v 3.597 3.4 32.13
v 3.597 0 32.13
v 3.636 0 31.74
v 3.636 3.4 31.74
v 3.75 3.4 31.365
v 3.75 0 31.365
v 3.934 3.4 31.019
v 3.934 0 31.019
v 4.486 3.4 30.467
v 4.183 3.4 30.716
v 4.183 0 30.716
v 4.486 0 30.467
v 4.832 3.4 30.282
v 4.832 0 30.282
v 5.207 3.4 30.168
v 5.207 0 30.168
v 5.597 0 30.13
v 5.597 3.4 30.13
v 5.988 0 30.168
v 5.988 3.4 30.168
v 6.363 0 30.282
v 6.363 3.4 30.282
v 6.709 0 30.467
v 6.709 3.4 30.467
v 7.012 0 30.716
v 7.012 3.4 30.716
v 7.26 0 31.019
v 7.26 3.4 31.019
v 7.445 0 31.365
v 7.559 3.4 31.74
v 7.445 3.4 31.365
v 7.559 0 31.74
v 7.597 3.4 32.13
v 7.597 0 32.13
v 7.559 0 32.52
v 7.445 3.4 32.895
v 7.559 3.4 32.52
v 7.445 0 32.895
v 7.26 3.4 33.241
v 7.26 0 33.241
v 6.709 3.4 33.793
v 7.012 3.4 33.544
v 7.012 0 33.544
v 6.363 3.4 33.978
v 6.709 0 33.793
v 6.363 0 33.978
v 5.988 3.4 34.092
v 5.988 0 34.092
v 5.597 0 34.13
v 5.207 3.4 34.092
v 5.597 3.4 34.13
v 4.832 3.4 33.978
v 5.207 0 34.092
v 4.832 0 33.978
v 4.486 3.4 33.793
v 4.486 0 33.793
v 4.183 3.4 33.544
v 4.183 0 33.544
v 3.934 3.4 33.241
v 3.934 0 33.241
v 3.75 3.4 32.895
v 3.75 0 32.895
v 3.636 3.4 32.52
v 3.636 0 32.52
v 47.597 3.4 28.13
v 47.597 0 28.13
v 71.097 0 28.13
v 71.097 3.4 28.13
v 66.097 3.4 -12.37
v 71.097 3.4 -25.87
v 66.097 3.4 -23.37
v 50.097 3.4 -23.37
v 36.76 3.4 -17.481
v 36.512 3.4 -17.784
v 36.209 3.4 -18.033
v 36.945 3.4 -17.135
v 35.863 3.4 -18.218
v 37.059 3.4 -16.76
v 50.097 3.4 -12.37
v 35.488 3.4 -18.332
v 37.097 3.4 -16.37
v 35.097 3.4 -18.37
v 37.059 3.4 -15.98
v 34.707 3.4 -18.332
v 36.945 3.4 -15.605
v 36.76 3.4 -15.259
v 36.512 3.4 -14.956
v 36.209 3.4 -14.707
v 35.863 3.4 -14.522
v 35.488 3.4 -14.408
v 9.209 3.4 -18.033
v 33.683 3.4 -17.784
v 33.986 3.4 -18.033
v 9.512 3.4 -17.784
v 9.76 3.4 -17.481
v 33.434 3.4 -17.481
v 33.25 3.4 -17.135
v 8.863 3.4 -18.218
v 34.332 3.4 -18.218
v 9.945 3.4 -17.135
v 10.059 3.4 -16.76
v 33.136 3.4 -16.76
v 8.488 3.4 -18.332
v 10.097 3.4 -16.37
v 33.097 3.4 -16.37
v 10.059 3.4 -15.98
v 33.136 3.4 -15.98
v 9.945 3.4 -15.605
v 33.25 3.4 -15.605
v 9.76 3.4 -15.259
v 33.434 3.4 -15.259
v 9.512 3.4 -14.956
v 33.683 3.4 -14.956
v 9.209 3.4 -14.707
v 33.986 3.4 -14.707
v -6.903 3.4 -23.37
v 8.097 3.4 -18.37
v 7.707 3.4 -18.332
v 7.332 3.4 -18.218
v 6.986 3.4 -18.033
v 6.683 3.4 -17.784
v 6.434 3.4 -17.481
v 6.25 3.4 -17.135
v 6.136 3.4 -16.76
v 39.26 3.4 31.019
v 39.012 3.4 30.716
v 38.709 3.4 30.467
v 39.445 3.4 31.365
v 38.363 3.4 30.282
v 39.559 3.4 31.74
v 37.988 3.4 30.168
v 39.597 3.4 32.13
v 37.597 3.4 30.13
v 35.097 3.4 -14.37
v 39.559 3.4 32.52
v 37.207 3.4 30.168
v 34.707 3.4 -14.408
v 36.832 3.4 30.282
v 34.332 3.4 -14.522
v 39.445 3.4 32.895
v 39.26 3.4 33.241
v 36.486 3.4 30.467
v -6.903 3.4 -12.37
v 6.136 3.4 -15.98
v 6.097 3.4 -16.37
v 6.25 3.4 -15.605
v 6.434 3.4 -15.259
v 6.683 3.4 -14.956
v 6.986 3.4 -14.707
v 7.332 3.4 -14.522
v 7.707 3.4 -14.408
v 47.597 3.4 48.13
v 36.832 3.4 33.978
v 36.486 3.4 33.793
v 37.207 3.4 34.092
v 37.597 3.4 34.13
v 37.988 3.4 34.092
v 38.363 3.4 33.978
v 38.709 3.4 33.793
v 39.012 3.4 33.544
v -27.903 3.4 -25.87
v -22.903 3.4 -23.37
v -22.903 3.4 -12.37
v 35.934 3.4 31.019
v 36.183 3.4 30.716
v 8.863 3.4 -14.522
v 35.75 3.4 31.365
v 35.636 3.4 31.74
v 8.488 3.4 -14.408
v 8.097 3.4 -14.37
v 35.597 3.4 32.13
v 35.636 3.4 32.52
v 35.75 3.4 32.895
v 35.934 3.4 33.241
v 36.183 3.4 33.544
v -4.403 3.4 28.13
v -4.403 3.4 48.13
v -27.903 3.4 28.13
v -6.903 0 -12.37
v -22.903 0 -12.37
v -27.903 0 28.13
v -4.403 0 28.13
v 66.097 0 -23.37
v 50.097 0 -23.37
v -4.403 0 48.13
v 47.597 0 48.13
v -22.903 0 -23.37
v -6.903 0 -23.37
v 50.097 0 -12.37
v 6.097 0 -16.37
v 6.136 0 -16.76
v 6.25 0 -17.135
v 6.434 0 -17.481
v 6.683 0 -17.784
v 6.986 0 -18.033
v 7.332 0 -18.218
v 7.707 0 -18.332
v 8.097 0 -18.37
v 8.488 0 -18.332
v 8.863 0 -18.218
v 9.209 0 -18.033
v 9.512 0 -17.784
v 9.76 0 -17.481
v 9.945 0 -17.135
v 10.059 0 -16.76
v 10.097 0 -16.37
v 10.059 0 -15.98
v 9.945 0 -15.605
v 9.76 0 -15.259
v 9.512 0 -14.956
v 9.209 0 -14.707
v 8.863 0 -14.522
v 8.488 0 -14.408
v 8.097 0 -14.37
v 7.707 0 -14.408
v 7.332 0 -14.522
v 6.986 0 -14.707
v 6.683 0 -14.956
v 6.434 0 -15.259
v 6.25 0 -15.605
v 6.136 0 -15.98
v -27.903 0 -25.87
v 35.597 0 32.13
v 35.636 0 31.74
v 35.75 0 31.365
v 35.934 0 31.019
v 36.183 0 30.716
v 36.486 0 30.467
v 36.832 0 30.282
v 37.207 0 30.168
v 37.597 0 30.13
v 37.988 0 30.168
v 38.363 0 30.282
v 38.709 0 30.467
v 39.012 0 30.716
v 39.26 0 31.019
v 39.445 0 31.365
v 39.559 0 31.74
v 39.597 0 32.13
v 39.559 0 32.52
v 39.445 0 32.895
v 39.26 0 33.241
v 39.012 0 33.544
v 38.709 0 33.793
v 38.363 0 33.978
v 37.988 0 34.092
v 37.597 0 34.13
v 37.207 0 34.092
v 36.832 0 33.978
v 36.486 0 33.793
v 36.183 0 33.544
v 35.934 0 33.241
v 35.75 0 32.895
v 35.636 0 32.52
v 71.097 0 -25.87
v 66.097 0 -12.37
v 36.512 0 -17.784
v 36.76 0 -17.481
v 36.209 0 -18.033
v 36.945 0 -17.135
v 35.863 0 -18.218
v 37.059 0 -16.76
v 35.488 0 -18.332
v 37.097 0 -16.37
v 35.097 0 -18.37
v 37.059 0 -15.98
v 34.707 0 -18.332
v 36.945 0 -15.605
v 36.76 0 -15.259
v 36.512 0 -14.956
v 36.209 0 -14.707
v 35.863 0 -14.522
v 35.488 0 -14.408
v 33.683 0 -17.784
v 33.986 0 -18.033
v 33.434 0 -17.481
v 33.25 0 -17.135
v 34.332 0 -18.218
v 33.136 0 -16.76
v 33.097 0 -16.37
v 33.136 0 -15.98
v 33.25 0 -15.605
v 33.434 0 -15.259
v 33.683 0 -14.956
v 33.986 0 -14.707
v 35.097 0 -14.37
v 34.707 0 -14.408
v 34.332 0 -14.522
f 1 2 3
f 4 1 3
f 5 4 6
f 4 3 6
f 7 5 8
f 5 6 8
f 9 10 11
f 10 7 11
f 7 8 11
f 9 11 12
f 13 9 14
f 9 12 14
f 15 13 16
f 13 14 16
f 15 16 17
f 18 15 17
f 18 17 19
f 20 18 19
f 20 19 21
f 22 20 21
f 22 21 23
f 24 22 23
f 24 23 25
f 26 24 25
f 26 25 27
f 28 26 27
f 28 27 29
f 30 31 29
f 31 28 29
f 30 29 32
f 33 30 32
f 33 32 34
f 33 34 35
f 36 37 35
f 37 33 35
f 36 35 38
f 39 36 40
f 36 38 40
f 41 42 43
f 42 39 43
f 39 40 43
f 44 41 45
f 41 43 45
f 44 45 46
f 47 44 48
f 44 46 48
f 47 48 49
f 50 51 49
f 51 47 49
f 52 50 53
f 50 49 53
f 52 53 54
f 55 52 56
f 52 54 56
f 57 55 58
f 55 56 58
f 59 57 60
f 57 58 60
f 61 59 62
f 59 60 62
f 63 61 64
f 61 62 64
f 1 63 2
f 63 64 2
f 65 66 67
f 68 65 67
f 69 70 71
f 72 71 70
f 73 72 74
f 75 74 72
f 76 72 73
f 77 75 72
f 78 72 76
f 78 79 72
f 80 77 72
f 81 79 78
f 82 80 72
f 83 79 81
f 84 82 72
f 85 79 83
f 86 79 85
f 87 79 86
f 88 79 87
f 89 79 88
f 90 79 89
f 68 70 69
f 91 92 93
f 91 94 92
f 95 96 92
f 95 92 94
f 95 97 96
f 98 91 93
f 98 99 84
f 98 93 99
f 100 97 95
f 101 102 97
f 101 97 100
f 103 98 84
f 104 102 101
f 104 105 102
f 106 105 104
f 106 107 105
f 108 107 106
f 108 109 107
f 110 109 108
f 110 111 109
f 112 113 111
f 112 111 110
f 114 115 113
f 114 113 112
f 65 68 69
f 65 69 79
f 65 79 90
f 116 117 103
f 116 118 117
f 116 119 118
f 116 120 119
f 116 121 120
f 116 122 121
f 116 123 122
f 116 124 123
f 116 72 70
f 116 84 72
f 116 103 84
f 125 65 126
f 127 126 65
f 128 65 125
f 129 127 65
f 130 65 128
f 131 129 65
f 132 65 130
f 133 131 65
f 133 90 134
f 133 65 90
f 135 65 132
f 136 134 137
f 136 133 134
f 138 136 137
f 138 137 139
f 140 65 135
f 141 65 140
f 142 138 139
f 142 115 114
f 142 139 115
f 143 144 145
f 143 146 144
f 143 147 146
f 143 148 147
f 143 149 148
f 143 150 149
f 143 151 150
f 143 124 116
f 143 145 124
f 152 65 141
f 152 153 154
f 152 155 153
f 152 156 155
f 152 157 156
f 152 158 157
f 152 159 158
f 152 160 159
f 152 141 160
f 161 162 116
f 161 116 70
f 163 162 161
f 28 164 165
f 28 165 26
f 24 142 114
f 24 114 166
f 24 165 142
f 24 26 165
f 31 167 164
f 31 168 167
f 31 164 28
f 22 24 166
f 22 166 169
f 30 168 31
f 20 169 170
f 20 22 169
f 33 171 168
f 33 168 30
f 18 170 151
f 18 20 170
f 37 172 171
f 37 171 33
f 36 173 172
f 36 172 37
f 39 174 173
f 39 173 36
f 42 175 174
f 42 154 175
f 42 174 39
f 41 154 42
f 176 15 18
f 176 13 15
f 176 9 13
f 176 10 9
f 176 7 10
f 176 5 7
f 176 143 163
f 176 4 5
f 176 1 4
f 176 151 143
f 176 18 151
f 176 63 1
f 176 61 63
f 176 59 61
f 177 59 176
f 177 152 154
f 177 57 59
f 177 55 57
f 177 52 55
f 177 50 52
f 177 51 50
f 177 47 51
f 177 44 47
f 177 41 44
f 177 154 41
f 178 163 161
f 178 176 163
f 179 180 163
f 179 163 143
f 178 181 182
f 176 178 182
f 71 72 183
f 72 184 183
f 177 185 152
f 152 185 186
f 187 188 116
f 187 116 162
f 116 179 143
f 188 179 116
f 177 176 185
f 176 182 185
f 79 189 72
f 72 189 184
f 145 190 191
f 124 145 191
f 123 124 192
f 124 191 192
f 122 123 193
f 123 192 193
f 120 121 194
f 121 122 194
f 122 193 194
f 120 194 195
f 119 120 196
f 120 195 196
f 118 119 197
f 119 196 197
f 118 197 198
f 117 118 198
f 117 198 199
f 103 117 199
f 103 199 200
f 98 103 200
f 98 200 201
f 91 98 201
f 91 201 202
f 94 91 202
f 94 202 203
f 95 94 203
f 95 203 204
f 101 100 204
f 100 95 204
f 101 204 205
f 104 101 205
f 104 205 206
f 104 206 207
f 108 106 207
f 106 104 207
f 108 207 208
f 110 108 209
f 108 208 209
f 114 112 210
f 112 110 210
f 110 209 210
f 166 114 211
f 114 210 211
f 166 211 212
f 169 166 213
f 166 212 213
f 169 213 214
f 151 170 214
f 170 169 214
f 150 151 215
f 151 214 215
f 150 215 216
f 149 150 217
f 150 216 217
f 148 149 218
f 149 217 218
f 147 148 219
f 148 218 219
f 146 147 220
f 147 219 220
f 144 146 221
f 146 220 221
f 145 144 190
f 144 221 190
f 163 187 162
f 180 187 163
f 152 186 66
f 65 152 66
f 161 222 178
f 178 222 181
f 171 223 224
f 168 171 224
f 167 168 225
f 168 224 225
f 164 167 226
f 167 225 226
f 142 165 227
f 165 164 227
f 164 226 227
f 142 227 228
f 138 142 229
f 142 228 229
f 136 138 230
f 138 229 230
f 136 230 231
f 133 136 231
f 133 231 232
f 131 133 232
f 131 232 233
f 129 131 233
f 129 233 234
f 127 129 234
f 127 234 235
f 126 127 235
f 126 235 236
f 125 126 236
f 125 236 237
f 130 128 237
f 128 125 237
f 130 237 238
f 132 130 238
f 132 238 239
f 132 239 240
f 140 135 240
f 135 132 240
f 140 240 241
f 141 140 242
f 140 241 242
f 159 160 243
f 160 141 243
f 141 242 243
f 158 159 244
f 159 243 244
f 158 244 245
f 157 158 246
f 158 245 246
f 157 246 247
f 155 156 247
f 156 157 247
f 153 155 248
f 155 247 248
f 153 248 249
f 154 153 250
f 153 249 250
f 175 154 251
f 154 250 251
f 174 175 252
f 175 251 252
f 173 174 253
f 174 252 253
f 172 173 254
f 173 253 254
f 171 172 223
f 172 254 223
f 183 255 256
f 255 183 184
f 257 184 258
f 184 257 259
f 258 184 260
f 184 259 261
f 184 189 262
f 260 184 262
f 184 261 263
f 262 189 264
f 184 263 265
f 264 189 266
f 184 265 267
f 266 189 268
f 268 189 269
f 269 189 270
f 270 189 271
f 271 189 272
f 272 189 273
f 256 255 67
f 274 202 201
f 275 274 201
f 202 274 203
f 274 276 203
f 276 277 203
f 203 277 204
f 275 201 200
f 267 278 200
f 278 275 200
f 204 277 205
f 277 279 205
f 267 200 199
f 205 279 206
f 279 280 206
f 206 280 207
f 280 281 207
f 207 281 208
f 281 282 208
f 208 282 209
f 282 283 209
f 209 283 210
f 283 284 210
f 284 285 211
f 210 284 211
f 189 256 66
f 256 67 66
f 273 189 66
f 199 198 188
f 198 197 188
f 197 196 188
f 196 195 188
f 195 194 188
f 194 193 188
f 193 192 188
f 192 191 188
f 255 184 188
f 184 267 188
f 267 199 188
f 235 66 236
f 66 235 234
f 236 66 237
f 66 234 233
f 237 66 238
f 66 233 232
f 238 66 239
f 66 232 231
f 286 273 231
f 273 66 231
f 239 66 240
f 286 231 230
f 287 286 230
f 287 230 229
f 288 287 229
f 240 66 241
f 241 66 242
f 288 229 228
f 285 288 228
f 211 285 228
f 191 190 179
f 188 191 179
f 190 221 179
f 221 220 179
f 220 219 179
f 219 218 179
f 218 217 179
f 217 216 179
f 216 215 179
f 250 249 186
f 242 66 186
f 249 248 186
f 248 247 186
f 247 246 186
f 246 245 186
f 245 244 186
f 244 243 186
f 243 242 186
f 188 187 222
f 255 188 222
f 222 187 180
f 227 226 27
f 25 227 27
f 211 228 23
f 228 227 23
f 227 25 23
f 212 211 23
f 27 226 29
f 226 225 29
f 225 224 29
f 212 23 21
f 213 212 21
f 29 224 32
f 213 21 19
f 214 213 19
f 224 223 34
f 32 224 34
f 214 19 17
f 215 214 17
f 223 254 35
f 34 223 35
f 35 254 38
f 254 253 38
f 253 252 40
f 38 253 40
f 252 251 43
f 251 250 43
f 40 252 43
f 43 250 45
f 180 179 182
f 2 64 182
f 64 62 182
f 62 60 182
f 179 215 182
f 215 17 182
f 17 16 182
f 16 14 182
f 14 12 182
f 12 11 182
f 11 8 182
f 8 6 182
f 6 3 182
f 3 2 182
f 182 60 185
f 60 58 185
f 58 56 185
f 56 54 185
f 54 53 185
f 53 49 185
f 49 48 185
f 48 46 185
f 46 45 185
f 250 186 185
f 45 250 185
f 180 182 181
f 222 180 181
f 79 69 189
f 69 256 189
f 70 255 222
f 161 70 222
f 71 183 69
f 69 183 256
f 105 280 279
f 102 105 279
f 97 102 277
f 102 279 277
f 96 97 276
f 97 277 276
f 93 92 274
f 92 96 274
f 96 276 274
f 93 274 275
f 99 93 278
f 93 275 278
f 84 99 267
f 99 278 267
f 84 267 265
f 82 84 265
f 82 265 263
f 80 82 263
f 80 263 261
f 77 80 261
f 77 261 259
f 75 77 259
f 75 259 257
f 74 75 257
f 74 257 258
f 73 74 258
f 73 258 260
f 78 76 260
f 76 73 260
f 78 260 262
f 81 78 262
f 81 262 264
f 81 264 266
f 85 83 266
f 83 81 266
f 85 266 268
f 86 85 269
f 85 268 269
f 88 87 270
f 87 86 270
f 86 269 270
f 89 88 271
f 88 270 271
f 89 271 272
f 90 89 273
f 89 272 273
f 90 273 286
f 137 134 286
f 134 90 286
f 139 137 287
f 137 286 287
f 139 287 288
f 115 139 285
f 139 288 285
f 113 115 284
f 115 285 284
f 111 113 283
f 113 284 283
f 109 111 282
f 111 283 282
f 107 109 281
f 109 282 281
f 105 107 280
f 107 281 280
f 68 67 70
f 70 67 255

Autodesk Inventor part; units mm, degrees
ref_plane "YZ Plane" through (0, 0, 0) normal (1, 0, 0) x (0, 1, 0)
ref_plane "XZ Plane" through (0, 0, 0) normal (0, 1, 0) x (-1, 0, 0)
ref_plane "XY Plane" through (0, 0, 0) normal (0, 0, 1) x (1, 0, 0)
sketch "Boceto1" plane through (0, 0, 0) normal (0, 1, 0) x (-1, 0, 0)
  line L0 (-71.0974, 28.13) -> (-71.0974, -25.87)
  line L1 (-71.0974, -25.87) -> (27.9026, -25.87)
  line L2 (27.9026, -25.87) -> (27.9026, 28.13)
  line L3 (4.4026, 48.13) -> (-47.5974, 48.13)
  line L4 (-47.5974, 48.13) -> (-47.5974, 28.13)
  line L5 (4.4026, 28.13) -> (4.4026, 48.13)
  line L6 (27.9026, 28.13) -> (4.4026, 28.13)
  line L7 (-47.5974, 28.13) -> (-71.0974, 28.13)
  circle A0 centre (-5.5974, 32.13) radius 2
  line L8 (-21.5974, 48.13) -> (-21.5974, -25.87)
  circle A1 centre (-37.5974, 32.13) radius 2
  line L9 (22.9026, -12.37) -> (6.9026, -12.37)
  line L10 (6.9026, -12.37) -> (6.9026, -23.37)
  line L11 (6.9026, -23.37) -> (22.9026, -23.37)
  line L12 (22.9026, -23.37) -> (22.9026, -12.37)
  line L13 (-66.0974, -12.37) -> (-50.0974, -12.37)
  line L14 (-50.0974, -12.37) -> (-50.0974, -23.37)
  line L15 (-50.0974, -23.37) -> (-66.0974, -23.37)
  line L16 (-66.0974, -23.37) -> (-66.0974, -12.37)
  circle A2 centre (-8.0974, -16.37) radius 2
  circle A3 centre (-35.0974, -16.37) radius 2
  point P0 (0, 0)
  dimension "d0" = 54
  dimension "d1" = 99
  dimension "d2" = 20
  dimension "d3" = 52
  dimension "d4" = 23.5
  dimension "d5" = 23.5
  dimension "d6" = 4
  dimension "d7" = 16
  dimension "d8" = 10
  dimension "d9" = 2.5
  dimension "d10" = 5
  dimension "d11" = 11
  dimension "d12" = 16
  dimension "d13" = 4
  dimension "d15" = 9.5
  dimension "d18" = 34
  dimension "d19" = 15
extrude "Extrusión1" add sketch "Boceto1" along normal blind 3.4
equation "\"Radio_pliegue\" = Grosor"
equation "\"Anchura_desahogo_plegado\" = Grosor"
equation "\"Profundidad_desahogo_plegado\" = 0.5 * Grosor"
equation "\"Tamaño_destalonado\" = 4 * Grosor"
equation "\"Remanente_mínimo\" = 2 * Grosor"
equation "\"Radiodetransición\" = Radio_pliegue"
equation "\"Tamaño_de_radio_de_Jacobi\" = Radio_pliegue"
equation "\"TamañoSeparación\" = Grosor"
equation "\"Grosor\" = 0.5"
properties part number "PlacaInferior"
